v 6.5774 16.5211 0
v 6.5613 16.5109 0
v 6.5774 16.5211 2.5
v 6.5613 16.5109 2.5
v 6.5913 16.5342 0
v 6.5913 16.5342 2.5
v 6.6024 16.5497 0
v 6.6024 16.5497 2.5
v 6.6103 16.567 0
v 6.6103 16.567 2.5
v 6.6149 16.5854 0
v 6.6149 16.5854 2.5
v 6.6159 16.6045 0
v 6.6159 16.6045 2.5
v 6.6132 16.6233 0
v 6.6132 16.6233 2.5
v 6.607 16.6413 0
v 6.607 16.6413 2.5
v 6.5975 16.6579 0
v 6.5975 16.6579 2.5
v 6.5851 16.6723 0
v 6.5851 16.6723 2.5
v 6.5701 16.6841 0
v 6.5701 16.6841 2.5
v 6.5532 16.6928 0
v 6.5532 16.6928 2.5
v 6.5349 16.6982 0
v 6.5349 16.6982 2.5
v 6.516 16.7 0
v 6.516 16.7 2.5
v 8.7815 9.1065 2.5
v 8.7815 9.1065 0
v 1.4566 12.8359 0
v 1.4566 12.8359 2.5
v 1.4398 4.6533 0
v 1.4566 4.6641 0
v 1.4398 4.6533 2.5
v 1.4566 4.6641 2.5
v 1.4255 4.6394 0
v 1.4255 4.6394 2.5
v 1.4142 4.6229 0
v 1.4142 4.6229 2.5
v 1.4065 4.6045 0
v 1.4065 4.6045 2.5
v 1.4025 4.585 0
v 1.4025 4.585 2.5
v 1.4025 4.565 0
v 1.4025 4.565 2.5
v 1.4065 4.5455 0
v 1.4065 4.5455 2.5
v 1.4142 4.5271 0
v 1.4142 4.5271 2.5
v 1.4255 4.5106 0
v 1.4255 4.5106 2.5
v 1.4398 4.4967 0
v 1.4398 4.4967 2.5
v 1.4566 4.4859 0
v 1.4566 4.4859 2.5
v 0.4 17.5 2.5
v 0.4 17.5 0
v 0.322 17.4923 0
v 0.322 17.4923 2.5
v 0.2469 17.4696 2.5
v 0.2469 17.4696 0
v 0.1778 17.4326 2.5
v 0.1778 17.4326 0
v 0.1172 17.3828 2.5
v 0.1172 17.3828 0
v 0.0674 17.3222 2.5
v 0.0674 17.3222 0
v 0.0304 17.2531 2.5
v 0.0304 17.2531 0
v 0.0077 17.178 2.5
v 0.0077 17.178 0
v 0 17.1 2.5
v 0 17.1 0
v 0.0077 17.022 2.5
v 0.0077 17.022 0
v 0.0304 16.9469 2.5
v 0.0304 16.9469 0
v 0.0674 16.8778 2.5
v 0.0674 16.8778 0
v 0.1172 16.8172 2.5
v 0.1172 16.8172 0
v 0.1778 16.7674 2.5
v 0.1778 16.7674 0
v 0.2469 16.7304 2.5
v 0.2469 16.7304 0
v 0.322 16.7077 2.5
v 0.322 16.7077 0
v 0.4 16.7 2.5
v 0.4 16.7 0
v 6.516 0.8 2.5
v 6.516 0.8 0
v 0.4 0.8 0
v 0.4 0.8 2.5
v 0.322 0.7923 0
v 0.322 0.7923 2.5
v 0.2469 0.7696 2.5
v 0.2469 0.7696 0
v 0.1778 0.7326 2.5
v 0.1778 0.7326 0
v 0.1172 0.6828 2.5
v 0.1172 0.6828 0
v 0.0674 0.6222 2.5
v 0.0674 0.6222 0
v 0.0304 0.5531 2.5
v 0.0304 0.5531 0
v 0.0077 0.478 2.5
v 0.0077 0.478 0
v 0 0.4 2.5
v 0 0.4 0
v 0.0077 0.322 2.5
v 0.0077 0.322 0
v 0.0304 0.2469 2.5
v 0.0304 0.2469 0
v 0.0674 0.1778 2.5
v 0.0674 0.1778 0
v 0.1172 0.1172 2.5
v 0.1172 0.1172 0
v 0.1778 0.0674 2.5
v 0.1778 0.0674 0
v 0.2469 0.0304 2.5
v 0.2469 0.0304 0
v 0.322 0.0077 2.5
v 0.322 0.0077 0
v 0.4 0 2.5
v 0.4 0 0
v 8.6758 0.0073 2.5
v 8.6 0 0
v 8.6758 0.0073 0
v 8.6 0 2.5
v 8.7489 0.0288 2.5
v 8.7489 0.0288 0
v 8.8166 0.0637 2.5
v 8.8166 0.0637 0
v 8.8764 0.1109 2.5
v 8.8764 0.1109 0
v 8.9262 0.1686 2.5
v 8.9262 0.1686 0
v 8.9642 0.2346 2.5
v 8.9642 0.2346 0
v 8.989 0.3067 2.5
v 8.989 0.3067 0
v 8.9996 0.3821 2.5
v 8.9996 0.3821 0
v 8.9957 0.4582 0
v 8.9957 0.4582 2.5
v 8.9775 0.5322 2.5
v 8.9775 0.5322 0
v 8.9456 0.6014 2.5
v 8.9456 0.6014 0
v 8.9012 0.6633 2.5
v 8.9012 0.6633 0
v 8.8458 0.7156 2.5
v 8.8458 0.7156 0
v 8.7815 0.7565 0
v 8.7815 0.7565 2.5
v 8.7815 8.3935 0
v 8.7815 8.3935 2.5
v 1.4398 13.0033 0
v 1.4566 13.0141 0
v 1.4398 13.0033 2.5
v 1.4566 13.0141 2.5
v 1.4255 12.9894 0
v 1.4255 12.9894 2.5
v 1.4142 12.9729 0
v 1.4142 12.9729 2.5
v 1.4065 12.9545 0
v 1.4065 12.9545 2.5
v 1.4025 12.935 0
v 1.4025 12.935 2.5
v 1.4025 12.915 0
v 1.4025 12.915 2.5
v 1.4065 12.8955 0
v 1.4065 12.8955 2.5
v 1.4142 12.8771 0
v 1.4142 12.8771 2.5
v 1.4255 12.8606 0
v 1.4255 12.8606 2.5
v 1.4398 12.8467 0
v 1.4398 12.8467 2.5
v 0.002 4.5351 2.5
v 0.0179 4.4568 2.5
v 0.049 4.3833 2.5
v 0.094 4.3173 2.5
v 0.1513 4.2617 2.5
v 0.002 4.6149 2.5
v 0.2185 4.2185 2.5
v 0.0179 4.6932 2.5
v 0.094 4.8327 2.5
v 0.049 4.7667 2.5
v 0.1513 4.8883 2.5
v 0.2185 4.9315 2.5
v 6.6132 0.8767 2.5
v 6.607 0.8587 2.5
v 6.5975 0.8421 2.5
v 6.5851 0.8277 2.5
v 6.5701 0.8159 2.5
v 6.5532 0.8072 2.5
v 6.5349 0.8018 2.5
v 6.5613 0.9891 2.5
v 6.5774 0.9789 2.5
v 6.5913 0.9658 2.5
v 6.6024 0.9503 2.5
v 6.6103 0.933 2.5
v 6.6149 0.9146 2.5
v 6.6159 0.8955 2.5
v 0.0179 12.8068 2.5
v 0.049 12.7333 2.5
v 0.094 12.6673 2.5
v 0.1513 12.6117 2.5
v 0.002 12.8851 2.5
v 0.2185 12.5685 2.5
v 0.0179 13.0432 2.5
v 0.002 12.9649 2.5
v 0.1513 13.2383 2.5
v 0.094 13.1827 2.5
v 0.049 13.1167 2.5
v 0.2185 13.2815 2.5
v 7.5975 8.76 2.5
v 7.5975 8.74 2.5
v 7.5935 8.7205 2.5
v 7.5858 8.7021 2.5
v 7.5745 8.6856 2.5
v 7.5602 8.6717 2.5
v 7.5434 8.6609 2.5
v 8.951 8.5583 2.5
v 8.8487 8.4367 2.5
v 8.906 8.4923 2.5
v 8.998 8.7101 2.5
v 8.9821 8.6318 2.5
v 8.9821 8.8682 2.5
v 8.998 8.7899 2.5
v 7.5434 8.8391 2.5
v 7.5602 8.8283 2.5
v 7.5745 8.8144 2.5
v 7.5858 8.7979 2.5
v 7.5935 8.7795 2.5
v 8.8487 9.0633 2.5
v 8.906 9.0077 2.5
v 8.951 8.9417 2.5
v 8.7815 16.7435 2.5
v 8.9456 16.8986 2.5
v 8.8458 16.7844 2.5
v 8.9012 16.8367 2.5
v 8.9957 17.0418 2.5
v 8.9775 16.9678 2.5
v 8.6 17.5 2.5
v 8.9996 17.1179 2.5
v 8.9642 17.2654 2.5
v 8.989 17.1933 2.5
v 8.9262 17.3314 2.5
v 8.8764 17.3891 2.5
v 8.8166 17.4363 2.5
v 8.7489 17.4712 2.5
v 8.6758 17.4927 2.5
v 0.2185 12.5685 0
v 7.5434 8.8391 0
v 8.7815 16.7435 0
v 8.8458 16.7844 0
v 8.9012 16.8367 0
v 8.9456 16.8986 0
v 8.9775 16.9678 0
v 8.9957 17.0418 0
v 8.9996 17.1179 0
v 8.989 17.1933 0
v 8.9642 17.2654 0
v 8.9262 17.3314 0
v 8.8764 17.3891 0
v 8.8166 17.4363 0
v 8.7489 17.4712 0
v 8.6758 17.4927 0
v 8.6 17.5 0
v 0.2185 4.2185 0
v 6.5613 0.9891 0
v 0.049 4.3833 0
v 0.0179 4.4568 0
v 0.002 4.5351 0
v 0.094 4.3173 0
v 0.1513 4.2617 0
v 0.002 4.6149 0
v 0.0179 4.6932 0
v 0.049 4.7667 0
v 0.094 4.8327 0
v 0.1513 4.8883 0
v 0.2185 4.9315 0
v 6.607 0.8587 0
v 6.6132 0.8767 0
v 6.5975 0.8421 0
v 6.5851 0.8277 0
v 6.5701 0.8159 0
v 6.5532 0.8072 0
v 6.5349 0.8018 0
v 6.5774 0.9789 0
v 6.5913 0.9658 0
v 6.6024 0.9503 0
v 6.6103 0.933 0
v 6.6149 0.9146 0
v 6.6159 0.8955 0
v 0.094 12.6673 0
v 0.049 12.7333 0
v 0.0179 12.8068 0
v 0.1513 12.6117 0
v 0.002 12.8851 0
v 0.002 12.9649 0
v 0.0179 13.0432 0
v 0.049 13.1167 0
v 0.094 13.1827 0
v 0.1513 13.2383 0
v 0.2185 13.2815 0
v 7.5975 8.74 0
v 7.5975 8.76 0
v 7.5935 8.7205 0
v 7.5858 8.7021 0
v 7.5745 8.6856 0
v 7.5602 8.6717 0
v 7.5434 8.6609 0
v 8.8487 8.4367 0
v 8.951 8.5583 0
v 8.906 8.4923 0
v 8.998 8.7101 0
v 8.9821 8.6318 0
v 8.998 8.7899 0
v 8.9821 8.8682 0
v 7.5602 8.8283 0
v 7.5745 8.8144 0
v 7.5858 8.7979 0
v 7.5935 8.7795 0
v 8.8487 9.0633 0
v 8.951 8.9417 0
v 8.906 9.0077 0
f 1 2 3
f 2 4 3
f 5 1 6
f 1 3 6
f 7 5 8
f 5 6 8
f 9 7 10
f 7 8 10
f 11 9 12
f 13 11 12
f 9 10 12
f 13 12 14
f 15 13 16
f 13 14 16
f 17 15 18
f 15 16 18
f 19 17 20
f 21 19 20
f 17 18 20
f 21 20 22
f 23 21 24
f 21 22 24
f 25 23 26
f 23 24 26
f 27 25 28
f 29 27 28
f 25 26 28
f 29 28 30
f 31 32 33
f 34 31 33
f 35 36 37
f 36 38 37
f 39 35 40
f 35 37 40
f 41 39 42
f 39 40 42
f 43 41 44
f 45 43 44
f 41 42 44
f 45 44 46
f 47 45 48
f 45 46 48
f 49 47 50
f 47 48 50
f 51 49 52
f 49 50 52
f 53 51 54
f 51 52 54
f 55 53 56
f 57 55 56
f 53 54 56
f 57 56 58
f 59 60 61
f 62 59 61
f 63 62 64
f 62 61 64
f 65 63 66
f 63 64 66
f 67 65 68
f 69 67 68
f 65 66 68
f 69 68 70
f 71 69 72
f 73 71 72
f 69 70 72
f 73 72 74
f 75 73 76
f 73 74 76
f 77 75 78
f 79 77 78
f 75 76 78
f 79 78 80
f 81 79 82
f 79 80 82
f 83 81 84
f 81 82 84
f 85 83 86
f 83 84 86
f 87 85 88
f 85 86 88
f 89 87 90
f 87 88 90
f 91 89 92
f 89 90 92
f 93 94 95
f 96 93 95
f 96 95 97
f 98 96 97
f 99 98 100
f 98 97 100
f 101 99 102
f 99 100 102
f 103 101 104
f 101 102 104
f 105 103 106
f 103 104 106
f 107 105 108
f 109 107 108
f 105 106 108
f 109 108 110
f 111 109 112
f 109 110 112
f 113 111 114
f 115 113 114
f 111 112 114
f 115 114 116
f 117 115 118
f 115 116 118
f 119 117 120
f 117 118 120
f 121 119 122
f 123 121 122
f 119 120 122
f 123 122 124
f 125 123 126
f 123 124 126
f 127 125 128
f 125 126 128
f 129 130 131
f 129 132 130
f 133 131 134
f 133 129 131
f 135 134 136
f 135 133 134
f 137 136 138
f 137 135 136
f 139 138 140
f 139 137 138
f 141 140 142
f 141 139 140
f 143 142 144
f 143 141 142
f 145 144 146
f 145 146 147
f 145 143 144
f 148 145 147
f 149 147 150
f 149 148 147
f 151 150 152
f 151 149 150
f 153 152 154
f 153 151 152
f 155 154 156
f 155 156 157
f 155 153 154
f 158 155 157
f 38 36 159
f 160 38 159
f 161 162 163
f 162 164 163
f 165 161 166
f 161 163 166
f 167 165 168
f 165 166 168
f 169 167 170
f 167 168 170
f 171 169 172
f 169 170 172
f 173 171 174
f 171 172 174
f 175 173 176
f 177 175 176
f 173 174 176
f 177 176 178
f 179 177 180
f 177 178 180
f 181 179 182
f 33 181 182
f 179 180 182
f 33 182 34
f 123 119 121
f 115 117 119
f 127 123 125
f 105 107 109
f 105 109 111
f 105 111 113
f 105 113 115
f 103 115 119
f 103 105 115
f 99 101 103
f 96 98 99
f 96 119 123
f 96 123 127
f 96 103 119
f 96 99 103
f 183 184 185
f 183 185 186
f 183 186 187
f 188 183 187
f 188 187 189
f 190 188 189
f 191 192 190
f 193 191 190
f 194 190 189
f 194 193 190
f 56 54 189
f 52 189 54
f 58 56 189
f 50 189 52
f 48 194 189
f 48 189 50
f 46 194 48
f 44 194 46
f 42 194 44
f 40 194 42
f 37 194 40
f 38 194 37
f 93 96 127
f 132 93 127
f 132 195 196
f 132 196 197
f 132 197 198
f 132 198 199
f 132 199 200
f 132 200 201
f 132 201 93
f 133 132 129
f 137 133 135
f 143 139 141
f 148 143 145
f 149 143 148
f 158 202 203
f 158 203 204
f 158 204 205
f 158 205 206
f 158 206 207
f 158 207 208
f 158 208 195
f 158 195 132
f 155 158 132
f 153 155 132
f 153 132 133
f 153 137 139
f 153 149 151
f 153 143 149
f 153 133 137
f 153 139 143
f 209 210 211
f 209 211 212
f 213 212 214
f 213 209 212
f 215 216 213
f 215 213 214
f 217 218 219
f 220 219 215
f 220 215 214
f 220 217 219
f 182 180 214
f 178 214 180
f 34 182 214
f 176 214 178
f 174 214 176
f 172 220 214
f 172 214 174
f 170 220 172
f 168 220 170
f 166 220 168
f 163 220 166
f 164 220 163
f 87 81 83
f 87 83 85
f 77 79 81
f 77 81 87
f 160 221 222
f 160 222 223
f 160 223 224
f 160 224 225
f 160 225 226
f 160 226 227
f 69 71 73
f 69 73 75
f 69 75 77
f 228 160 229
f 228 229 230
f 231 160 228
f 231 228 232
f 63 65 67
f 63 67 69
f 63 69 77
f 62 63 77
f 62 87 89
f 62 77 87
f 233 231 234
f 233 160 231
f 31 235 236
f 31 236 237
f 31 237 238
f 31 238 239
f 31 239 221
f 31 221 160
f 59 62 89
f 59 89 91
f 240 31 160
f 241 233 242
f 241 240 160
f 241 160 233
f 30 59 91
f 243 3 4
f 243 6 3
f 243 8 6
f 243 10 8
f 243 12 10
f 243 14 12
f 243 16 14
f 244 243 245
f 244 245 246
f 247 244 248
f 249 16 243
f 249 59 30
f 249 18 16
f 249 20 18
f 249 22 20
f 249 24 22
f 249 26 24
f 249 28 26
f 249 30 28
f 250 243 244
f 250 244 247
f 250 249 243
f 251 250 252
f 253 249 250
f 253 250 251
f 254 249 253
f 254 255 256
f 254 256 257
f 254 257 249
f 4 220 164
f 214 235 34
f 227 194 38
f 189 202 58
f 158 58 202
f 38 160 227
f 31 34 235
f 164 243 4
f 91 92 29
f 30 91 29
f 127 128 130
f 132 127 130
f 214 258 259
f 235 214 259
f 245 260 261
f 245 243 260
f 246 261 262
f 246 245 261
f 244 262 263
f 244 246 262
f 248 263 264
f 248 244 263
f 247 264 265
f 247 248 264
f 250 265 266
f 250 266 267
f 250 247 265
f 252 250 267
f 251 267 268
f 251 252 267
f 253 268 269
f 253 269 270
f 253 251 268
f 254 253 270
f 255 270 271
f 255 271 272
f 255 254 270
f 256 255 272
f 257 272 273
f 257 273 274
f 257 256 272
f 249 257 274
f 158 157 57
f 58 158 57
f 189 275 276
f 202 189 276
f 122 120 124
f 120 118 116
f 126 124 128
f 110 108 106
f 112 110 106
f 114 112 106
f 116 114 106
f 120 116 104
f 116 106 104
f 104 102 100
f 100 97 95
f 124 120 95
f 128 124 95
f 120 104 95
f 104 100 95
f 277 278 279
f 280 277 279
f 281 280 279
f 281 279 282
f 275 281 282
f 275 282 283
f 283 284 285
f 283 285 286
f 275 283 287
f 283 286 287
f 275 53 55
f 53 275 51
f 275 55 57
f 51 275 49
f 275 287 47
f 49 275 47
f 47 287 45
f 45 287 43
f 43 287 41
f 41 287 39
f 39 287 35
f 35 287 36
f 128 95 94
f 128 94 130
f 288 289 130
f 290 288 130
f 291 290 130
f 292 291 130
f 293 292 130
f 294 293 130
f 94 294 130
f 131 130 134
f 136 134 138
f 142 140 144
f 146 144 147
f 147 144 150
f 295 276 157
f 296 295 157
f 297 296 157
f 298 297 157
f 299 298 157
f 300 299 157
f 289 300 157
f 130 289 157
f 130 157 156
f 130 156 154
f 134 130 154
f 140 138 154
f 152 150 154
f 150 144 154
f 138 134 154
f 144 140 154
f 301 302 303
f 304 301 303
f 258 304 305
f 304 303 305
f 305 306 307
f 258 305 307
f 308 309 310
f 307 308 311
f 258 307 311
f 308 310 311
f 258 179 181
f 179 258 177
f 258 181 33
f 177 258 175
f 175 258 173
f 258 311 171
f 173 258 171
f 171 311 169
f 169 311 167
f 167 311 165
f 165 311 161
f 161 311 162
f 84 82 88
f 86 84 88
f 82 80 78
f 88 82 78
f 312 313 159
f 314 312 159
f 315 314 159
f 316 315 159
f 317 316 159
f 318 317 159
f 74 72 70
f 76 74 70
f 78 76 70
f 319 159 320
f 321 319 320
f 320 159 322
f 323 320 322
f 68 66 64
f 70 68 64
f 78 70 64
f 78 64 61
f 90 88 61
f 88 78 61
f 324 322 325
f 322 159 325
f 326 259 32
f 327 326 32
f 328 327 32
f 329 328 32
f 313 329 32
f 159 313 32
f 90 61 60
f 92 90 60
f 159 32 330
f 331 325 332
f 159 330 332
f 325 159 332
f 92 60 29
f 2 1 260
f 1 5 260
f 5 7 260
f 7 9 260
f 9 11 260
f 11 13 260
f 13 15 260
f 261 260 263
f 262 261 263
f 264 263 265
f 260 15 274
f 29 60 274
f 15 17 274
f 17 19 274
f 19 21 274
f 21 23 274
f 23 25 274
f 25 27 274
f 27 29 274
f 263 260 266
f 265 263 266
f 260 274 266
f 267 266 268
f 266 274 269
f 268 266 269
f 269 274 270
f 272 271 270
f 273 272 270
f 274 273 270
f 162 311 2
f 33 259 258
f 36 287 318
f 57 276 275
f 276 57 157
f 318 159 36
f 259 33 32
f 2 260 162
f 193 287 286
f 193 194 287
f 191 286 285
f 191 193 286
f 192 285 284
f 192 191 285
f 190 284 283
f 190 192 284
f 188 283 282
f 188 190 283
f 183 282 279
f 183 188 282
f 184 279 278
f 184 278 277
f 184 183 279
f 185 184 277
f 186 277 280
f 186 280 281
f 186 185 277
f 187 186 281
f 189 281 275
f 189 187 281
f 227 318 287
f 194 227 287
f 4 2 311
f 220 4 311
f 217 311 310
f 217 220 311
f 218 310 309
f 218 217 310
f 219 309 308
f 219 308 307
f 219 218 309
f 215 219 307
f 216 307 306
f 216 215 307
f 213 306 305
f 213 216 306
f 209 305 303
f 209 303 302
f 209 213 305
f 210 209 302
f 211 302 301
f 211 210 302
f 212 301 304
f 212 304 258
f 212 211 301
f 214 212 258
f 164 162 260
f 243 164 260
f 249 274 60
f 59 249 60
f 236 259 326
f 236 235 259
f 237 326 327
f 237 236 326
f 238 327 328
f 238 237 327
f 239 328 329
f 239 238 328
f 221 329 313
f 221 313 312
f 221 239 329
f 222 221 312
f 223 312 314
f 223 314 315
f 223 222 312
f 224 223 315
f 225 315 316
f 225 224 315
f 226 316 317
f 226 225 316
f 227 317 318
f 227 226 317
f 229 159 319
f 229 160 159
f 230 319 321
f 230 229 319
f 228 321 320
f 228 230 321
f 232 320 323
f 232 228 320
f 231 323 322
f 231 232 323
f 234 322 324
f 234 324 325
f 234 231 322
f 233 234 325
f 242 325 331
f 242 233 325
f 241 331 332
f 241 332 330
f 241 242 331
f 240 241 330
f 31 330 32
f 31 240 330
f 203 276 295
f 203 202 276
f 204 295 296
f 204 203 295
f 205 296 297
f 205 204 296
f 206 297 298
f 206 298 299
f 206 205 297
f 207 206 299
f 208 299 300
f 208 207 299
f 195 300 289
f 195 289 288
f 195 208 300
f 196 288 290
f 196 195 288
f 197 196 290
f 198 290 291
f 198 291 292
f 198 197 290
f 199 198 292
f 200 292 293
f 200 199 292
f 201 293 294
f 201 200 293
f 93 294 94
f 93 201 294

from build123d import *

# Parameters (mm, degrees)
BOSS_EXTRUDE1_DEPTH = 2.5
FILLET1_R           = 0.4
FILLET2_R           = 0.1


with BuildPart() as part:
    # Sketch2 → Boss-Extrude1 (new body)
    with BuildSketch(Plane.XY):
        with BuildLine():
            Line((0.4, 16.7), (6.932774682, 16.7))
            Line((6.932774682, 16.7), (-0.481596575, 12.925))
            Line((-0.481596575, 12.925), (7.718403425, 8.75))
            Line((7.718403425, 8.75), (-0.481596575, 4.575))
            Line((-0.481596575, 4.575), (6.932774682, 0.8))
            Line((6.932774682, 0.8), (0.4, 0.8))
            ThreePointArc((0.4, 0.8), (0, 0.4), (0.4, 0))
            Line((0.4, 0), (10.267225318, 0))
            Line((10.267225318, 0), (1.281596575, 4.575))
            Line((1.281596575, 4.575), (9.481596575, 8.75))
            Line((9.481596575, 8.75), (1.281596575, 12.925))
            Line((1.281596575, 12.925), (10.267225318, 17.5))
            Line((10.267225318, 17.5), (0.4, 17.5))
            ThreePointArc((0.4, 17.5), (0, 17.1), (0.4, 16.7))
        make_face()
    extrude(amount=BOSS_EXTRUDE1_DEPTH)

    # Fillet1
    fillet1_edges = [part.edges().sort_by_distance(p)[0] for p in [
        (10.267225318, 17.5, 1.25),
        (9.481596575, 8.75, 1.25),
        (10.267225318, 0, 1.25),
        (-0.481596575, 4.575, 1.25),
        (-0.481596575, 12.925, 1.25),
    ]]
    fillet(fillet1_edges, radius=FILLET1_R)

    # Fillet2
    fillet2_edges = [part.edges().sort_by_distance(p)[0] for p in [
        (1.281596575, 12.925, 1.25),
        (1.281596575, 4.575, 1.25),
        (6.932774682, 0.8, 1.25),
        (7.718403425, 8.75, 1.25),
        (6.932774682, 16.7, 1.25),
    ]]
    fillet(fillet2_edges, radius=FILLET2_R)


solid = part.part
